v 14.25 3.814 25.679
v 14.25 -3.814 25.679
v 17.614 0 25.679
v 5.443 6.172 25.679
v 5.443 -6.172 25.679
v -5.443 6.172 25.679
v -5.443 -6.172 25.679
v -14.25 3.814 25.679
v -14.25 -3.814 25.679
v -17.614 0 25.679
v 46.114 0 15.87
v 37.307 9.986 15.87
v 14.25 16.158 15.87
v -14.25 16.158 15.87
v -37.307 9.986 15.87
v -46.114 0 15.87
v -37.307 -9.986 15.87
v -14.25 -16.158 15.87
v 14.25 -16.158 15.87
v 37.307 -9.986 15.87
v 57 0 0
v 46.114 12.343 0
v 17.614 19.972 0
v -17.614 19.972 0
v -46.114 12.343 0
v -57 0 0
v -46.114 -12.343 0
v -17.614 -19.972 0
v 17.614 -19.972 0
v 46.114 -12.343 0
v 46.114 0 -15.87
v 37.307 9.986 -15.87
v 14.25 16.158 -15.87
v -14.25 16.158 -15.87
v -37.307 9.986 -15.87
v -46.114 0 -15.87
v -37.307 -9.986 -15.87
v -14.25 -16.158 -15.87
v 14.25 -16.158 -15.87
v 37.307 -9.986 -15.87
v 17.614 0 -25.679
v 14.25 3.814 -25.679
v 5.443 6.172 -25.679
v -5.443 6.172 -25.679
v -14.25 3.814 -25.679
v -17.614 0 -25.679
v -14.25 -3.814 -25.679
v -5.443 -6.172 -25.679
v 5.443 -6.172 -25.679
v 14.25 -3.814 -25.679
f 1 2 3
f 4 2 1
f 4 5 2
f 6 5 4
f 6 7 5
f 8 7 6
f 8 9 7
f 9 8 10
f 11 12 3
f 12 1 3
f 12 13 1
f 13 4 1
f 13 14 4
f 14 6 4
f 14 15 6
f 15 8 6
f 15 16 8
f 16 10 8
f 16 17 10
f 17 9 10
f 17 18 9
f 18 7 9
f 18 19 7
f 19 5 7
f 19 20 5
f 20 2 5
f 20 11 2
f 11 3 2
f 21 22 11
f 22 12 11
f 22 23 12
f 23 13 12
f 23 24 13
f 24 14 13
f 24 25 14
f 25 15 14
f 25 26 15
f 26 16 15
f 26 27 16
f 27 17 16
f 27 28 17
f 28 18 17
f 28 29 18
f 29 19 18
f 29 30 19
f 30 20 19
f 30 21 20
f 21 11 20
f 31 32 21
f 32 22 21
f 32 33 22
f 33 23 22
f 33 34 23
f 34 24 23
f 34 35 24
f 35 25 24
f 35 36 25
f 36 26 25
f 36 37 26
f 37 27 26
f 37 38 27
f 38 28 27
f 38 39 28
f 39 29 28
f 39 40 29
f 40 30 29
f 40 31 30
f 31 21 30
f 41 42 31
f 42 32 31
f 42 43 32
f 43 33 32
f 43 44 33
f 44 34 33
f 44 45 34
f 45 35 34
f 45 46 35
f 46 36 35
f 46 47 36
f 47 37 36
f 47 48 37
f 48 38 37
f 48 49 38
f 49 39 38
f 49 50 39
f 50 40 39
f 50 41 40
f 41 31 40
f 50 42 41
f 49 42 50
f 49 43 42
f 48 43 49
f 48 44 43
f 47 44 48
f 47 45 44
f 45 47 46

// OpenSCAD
// Generated by SolidPython 1.0.1 on 2020-07-29 00:46:53


scale(v = [19, 7, 9]) {
	sphere(r = 3);
}
/***********************************************
*********      SolidPython code:      **********
************************************************
 
# import packages: SolidPython
from solid import *
from solid.utils import *
from itertools import chain, combinations, permutations


class Resize:

    def __init__(self, scad_file):
        self.scad_file = scad_file
        #self.scad_file = import_scad(scad_file)
        # cone/cylinder param:
        self.r1 = 0
        self.r2 = 0
        self.h = 0
        # rectangular prism param:
        self.w = 0
        self.l = 0
        # ellipse param:
        self.r = 0

    # import OpenScad code (file name corresponds to shape)


    # classify shape + parameters
    def assign(self, param1, param2, param3):
        if self.scad_file == 'cone.scad':
            self.r1 = param1
            self.r2 = param2
            self.h = param3
        elif self.scad_file == 'cylinder.scad':
            self.r1 = param1
            self.r2 = param2
            self.h = param3
        elif self.scad_file == 'rectangularPrism.scad':
            self.h = param1
            self.l = param2
            self.w = param3
        else:
            self.r = param1
            self.h = param2

    # resize parameters
    def iterate(self):
        x = range(3, 20, 2)
        i = 1
        if self.scad_file == 'cone.scad':
            tempList = list(permutations(x, 2))
            for temp in tempList:
                param1 = temp[0]
                param2 = temp[1]
                filepath = 'produced_scad_files/' + 'cone' + str(param1) + '_' + str(param2) + '_' + '.scad'
                scad_render_to_file(cylinder(h=param1, r1=param2, r2=0), filepath)

        elif self.scad_file == 'cylinder.scad':
            tempList = list(permutations(x, 3))
            for temp in tempList:
                param1 = temp[0]
                param2 = temp[1]
                filepath = 'produced_scad_files/' + 'cylinder' + str(param1) + '_' + str(param2) + '_' + '.scad'
                scad_render_to_file(cylinder(h=param1, r1=param2, r2=param2), filepath)

        elif self.scad_file == 'rectangularPrism.scad':
            tempList = list(permutations(x, 3))
            for temp in tempList:
                param1 = temp[0]
                param2 = temp[1]
                param3 = temp[2]
                filepath = 'produced_scad_files/' + 'rectangularPrism' + str(param1) + '_' + str(param2) + '_' + str(
                    param3) + '.scad'
                scad_render_to_file(cube(size=(param1, param2, param3)), filepath)

        elif self.scad_file == 'ellipse.scad':
            tempList = list(permutations(x, 4))
            for temp in tempList:
                param1 = temp[0]
                param2 = temp[1]
                param3 = temp[2]
                param4 = temp[3]
                filepath = 'produced_scad_files/' + 'ellipse' + str(param1) + '_' + str(param2) + '_' + str(param3) + '_' + str(param4) + '.scad'
                scad_render_to_file(scale([param1, param2, param3])(sphere(r=param4)), filepath)

    def render_to_scadfile(self):
        scad_render_to_file(scad, 'example.scad') 
 
************************************************/
